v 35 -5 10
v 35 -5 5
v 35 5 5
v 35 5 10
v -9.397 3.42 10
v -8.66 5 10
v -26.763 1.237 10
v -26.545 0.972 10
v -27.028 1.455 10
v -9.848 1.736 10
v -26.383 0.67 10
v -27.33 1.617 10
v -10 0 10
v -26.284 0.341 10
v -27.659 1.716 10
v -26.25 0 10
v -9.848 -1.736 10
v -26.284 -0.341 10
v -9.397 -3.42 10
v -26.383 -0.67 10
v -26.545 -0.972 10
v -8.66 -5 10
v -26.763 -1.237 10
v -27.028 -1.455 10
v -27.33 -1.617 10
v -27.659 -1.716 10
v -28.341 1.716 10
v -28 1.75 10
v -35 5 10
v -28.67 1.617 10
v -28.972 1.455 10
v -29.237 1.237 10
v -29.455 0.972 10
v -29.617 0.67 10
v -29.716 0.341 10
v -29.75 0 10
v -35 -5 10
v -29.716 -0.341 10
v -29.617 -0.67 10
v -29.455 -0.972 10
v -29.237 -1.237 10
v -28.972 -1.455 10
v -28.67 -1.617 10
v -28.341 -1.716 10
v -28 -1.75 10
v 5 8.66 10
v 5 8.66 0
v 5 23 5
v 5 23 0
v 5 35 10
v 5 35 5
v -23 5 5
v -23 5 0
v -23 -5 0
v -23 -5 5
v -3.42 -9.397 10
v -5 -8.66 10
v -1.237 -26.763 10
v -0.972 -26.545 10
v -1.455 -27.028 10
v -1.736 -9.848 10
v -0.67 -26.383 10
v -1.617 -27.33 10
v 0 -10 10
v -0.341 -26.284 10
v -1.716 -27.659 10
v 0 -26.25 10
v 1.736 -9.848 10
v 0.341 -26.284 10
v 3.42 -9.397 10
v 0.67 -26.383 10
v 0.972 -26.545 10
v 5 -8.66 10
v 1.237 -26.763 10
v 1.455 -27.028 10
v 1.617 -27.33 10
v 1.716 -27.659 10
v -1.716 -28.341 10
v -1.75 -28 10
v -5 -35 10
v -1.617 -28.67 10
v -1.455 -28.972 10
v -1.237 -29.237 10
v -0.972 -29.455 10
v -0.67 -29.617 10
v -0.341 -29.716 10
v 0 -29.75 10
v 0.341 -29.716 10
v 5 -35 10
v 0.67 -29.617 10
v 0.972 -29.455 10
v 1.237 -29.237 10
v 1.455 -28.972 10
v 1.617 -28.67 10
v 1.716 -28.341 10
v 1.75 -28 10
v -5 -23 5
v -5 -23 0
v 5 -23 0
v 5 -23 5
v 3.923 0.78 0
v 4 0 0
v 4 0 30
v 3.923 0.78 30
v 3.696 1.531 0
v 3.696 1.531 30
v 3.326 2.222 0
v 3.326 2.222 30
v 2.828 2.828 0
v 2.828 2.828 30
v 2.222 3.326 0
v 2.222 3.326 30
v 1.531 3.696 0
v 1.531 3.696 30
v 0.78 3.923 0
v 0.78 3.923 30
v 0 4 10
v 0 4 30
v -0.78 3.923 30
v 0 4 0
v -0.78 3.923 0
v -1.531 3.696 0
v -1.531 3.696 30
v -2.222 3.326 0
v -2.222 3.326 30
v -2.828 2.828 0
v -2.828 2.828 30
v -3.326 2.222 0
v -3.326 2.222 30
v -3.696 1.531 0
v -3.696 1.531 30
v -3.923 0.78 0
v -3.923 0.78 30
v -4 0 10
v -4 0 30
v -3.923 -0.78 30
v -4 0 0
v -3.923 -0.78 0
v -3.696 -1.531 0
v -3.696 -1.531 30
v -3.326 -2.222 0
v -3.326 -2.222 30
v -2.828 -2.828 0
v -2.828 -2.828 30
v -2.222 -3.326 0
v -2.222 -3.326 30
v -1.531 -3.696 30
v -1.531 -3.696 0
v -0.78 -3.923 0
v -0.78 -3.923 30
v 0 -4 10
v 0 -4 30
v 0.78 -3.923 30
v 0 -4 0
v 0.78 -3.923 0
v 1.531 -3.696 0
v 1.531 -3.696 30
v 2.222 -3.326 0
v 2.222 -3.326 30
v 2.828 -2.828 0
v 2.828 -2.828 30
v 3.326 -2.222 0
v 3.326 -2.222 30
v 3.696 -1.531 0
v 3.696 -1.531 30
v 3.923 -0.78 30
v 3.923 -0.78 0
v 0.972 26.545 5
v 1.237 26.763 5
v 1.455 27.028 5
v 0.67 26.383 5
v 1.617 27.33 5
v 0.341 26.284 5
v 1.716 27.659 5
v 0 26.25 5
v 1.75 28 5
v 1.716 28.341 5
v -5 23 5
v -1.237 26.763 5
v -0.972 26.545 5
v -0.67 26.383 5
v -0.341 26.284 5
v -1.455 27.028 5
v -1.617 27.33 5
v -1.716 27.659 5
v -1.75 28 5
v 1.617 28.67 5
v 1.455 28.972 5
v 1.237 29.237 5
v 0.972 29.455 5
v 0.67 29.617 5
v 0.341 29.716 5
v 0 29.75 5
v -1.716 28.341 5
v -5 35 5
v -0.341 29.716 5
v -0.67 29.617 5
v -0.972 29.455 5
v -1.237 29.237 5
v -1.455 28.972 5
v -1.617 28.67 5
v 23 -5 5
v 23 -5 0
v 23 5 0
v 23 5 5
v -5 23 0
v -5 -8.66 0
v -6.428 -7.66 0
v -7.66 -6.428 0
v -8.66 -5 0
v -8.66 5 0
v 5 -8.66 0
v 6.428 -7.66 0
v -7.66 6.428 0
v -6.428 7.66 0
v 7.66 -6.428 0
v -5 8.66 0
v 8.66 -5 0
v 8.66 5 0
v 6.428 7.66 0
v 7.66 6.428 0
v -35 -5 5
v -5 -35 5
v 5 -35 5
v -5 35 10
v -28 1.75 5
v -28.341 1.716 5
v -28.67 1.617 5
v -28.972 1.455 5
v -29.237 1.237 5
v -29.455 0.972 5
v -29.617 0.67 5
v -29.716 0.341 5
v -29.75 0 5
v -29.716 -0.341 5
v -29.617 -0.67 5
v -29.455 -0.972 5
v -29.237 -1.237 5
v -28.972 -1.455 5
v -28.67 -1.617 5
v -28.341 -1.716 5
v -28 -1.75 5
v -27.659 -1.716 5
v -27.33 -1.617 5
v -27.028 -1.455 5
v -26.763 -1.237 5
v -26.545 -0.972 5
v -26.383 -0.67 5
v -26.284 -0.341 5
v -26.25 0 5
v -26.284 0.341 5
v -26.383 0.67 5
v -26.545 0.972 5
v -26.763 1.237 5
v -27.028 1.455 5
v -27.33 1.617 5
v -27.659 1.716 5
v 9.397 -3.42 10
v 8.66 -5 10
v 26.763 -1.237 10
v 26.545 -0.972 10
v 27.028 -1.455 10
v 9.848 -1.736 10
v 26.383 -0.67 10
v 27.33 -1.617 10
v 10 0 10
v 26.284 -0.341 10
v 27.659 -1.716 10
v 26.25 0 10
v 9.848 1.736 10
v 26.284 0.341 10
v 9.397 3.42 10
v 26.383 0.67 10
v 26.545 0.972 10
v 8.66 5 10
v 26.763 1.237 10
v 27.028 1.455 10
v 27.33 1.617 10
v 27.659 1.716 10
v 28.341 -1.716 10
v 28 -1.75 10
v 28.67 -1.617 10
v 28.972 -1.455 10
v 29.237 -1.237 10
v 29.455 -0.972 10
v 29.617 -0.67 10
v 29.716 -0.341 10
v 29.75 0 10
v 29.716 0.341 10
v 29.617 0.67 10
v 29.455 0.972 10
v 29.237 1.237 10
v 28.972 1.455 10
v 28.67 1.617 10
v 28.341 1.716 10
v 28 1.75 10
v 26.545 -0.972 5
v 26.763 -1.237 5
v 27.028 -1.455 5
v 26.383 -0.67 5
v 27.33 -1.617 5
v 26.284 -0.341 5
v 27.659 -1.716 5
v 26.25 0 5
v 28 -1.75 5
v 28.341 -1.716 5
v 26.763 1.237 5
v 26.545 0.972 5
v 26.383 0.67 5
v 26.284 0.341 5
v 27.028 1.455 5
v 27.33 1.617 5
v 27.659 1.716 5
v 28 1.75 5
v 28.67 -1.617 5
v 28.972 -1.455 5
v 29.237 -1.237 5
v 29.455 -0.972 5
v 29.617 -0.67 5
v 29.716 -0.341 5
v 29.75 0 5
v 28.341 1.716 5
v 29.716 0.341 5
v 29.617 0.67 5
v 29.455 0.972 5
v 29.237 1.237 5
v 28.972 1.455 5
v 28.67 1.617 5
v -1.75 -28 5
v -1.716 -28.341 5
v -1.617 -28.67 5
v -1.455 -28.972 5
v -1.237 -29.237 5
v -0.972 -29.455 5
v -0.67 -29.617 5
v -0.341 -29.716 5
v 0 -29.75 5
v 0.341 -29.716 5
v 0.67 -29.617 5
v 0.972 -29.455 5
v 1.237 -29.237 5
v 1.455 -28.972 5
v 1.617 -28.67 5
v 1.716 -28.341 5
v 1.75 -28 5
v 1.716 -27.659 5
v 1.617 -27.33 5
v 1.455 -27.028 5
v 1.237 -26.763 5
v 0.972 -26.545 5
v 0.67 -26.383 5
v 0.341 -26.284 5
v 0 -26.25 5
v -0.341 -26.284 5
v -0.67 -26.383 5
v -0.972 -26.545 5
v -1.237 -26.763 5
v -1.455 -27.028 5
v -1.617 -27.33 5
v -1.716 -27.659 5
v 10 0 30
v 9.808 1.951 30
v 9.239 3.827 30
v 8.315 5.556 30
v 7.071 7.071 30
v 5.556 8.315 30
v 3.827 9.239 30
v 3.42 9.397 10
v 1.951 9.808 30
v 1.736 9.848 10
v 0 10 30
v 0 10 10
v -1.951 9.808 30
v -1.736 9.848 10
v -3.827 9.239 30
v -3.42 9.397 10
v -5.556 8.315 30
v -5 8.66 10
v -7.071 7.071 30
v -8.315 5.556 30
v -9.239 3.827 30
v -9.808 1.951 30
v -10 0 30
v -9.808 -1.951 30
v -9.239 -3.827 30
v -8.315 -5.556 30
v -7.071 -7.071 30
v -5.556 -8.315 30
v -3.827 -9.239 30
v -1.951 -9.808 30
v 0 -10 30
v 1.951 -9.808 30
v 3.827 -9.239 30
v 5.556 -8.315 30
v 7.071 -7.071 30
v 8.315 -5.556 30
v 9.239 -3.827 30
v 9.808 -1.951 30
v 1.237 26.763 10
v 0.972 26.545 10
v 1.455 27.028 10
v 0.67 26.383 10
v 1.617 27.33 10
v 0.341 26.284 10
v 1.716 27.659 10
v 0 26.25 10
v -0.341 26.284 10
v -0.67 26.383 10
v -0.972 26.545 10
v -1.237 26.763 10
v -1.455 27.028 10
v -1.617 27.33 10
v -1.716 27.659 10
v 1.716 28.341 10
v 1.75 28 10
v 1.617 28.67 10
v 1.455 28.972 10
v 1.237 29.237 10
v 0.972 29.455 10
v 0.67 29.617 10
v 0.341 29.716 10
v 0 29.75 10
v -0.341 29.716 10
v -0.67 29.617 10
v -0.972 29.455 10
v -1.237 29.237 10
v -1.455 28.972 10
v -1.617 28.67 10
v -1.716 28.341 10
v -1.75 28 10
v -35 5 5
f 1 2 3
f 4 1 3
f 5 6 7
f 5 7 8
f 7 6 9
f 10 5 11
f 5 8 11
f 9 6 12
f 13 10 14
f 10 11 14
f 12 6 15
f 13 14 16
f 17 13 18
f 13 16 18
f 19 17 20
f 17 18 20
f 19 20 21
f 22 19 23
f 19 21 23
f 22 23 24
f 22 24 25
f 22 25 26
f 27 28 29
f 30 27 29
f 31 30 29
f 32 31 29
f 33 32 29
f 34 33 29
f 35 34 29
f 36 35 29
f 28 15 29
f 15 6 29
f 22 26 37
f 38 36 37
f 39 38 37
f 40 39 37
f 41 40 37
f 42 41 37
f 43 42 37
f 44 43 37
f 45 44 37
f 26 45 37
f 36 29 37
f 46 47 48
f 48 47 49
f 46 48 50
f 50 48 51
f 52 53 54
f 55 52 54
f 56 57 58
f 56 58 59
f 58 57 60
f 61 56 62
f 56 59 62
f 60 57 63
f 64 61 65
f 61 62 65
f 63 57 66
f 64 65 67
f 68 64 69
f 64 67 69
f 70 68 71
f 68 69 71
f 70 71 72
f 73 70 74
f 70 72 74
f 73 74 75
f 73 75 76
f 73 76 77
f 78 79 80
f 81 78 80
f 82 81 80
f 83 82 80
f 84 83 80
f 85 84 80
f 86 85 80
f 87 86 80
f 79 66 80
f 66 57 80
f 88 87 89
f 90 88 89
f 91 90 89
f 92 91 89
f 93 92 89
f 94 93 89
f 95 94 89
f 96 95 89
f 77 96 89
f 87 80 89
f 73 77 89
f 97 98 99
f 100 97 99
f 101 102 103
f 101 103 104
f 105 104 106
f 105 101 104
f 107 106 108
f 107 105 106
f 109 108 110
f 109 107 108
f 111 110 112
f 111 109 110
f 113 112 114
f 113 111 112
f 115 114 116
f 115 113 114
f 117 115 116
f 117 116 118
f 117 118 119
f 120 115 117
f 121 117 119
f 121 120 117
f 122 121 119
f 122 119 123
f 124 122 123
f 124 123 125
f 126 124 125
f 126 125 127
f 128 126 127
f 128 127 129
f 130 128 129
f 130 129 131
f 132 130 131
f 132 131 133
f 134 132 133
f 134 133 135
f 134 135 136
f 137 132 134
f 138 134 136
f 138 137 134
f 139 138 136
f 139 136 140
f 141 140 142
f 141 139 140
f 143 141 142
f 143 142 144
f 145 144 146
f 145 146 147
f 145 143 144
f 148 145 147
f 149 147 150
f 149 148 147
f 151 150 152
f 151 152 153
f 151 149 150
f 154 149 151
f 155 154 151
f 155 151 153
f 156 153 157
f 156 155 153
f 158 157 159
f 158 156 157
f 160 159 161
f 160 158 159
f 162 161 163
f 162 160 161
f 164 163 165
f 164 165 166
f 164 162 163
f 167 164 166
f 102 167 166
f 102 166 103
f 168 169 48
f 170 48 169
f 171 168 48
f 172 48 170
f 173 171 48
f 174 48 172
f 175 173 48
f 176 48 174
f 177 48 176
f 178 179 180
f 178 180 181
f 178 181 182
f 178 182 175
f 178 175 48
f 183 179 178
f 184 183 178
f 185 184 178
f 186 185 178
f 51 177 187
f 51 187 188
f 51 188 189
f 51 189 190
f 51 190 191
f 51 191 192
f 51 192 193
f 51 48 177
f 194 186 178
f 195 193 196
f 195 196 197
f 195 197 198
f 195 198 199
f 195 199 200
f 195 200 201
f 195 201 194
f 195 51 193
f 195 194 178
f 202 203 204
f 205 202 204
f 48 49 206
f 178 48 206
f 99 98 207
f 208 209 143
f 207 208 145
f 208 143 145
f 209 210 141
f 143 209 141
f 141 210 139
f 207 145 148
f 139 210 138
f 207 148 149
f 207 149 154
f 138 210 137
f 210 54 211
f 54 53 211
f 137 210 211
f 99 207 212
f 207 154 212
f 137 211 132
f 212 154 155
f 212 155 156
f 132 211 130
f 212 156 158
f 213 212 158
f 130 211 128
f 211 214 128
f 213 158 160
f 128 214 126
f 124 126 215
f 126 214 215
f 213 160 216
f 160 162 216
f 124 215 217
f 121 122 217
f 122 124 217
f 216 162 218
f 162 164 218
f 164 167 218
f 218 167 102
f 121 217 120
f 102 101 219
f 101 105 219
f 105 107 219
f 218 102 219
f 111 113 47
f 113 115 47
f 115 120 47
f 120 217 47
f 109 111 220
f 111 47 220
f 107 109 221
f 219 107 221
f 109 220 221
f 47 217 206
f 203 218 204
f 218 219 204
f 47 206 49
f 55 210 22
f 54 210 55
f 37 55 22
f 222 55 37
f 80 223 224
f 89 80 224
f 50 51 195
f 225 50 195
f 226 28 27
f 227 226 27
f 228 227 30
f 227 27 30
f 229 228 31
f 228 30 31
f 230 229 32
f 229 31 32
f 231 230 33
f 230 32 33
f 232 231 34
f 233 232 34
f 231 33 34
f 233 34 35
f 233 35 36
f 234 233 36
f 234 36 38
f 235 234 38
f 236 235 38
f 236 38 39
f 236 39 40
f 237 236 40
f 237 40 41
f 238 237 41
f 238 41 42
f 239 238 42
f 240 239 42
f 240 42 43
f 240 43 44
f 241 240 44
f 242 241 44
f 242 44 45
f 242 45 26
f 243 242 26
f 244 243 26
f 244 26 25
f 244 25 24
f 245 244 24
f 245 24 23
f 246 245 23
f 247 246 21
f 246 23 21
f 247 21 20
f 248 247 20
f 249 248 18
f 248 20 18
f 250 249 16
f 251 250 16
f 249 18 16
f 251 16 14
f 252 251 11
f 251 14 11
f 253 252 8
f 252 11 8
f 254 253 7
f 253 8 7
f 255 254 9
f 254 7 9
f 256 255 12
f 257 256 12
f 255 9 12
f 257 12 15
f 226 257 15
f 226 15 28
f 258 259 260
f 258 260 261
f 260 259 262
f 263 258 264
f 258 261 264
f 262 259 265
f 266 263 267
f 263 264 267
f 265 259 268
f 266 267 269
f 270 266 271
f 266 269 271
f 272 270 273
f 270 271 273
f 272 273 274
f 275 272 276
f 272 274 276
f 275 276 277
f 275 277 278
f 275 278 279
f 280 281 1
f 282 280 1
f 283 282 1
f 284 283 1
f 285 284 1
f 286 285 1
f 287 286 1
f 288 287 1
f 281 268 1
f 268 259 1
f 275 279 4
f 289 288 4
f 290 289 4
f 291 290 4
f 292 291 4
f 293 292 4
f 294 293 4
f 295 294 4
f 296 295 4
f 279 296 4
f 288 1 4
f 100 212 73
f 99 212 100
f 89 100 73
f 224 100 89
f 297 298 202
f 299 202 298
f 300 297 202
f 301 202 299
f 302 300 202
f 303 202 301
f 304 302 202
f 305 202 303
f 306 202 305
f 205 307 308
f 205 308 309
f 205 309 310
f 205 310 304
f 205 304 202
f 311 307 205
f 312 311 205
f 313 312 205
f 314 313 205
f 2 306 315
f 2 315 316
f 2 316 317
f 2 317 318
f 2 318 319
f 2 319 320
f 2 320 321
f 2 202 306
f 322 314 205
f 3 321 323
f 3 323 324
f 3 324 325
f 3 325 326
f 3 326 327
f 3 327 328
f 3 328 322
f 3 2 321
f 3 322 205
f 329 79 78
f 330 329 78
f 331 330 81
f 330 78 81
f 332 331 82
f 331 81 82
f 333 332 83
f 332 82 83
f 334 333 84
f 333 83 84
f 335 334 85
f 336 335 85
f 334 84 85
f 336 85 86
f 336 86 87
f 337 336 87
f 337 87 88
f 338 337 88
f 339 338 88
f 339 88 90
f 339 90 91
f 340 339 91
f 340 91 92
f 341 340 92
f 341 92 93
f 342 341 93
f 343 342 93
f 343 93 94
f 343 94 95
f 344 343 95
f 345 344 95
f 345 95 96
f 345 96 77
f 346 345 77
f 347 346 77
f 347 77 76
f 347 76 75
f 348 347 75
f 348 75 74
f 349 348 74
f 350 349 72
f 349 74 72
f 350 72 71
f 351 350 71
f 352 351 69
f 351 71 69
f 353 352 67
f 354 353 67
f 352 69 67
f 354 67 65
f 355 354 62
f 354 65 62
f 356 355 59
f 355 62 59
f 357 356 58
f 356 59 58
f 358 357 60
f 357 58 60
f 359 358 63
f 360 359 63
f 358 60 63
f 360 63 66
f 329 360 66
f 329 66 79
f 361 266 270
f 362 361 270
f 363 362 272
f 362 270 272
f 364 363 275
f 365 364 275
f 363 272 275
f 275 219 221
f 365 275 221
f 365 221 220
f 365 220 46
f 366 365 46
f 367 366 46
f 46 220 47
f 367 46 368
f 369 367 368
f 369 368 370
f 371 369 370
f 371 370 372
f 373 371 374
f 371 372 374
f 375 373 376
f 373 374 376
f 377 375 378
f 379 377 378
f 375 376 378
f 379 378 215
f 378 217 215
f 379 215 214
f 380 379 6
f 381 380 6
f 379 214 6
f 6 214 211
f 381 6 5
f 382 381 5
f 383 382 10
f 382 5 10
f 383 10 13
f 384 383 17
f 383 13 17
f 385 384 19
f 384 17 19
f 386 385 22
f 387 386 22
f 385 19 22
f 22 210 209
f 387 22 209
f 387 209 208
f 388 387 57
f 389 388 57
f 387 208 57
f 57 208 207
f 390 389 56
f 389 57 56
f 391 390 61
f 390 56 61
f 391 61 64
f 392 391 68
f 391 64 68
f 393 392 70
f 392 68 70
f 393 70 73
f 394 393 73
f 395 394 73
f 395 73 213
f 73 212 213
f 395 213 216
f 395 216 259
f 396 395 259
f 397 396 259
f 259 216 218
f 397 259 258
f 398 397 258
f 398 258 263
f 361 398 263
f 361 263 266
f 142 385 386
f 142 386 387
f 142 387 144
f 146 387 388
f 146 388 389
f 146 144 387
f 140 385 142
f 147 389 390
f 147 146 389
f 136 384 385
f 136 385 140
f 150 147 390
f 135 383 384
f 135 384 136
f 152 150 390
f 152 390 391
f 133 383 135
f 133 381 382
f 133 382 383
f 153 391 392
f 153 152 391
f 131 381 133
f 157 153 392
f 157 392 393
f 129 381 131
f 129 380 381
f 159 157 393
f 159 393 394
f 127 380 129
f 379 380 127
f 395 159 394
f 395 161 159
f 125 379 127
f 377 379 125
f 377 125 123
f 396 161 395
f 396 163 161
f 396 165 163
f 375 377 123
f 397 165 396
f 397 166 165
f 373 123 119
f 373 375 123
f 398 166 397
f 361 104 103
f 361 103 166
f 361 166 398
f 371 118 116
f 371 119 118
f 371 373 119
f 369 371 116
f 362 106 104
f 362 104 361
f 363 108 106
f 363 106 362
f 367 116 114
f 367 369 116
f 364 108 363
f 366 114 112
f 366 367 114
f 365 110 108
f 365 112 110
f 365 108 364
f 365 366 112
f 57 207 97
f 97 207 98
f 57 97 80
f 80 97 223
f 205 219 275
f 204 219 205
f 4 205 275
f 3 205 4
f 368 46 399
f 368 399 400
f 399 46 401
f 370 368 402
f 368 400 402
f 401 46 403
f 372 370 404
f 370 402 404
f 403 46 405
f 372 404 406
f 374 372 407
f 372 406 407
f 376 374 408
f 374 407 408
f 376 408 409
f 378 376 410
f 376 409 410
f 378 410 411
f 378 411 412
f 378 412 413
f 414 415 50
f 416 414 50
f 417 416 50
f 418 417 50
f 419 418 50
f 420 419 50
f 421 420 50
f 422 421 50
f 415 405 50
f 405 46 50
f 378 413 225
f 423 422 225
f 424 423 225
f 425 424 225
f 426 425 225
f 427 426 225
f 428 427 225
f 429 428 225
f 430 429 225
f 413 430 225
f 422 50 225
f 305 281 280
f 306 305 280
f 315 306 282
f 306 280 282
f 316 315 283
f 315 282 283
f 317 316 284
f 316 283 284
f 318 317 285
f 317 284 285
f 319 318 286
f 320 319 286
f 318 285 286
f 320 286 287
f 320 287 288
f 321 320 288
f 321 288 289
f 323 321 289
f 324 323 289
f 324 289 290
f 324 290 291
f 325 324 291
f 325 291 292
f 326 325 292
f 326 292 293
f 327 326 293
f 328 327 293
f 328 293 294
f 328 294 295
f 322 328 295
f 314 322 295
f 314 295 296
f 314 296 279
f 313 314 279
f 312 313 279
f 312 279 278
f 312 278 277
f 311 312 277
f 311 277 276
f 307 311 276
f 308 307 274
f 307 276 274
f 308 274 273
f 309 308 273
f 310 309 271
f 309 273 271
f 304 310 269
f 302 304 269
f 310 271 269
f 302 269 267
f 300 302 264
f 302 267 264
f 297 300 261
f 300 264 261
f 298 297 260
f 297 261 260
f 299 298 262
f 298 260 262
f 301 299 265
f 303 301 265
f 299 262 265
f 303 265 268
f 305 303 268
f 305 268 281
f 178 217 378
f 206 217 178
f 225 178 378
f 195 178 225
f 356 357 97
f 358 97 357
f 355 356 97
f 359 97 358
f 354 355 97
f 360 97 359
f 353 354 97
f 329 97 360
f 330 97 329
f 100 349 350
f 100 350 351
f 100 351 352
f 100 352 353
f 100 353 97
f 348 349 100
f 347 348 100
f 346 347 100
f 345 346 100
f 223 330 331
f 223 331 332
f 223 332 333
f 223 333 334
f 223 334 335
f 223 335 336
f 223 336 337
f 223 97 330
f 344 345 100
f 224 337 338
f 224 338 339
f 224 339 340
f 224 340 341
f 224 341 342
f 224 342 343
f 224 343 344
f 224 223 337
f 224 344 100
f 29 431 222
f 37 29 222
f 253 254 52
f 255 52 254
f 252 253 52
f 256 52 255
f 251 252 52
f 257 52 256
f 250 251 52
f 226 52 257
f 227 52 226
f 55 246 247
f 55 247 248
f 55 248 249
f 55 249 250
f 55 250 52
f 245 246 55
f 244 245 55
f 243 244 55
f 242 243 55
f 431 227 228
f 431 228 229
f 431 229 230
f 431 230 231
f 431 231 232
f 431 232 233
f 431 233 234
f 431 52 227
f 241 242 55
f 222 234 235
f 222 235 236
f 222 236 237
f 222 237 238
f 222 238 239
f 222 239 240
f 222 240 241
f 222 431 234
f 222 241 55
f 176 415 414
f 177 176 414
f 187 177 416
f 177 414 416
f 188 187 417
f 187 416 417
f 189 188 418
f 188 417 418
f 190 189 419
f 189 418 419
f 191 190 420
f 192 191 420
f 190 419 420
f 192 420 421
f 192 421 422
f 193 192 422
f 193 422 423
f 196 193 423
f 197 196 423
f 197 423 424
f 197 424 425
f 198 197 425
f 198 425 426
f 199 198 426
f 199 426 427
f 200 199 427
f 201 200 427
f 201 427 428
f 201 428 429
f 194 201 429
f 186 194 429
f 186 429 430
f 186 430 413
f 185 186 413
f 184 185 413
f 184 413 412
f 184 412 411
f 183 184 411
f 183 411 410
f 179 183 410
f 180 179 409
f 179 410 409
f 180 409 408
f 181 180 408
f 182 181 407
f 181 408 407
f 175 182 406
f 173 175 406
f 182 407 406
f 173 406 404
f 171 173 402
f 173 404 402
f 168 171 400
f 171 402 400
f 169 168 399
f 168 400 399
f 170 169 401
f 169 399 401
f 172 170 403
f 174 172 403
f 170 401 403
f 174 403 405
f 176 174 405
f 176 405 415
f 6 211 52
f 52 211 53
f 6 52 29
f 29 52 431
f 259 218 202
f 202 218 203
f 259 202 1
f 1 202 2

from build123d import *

# Parameters (mm, degrees)
SKETCH_1_R               = 10
SKETCH_1_R_2             = 4
EXTRUDE_1_DEPTH          = 30
SKETCH_2_W               = 10
SKETCH_2_H               = 31
EXTRUDE_2_DEPTH          = 10
SKETCH_3_W               = 10
SKETCH_3_H               = 12
CUT_EXTRUDE_1_DEPTH      = 5
HOLE_WIZARD_3_5_3_5_1_D  = 3.5
PATTERN_CIRCULAR_1_COUNT = 4


with BuildPart() as part:
    # Эскиз1 → Бобышка-Вытянуть1 (new body)
    with BuildSketch(Plane.XY):
        Circle(SKETCH_1_R)
        Circle(SKETCH_1_R_2, mode=Mode.SUBTRACT)
    extrude(amount=EXTRUDE_1_DEPTH)

    # Эскиз2 → Бобышка-Вытянуть2 (add)
    with BuildSketch(Plane(origin=(0, 0, 0), x_dir=(-1, 0, 0), z_dir=(0, 0, -1))):
        with Locations((0, 19.5)):
            Rectangle(SKETCH_2_W, SKETCH_2_H)
    extrude_2 = extrude(amount=-EXTRUDE_2_DEPTH)

    # Эскиз3 → Вырез-Вытянуть1 (cut)
    with BuildSketch(Plane(origin=(0, 0, 0), x_dir=(-1, 0, 0), z_dir=(0, 0, -1))):
        with Locations((0, 29)):
            Rectangle(SKETCH_3_W, SKETCH_3_H)
    cut_extrude_1 = extrude(amount=-CUT_EXTRUDE_1_DEPTH, mode=Mode.SUBTRACT)

    # Диаметр отверстия Ø3.5 (3.5)1 (through all)
    with Locations(Plane(origin=(0, 0, 5), x_dir=(-1, 0, 0), z_dir=(0, 0, -1))):
        with Locations((0, 28)):
            hole_wizard_3_5_3_5_1 = Hole(HOLE_WIZARD_3_5_3_5_1_D / 2)

    # Круговой массив1: Бобышка-Вытянуть2, Вырез-Вытянуть1, Диаметр отверстия Ø3.5 (3.5)1 ×4 about axis
    pattern_circular_1_axis = Axis((0, 0, 0), (0, 0, 1))
    for i in range(1, PATTERN_CIRCULAR_1_COUNT):
        add(extrude_2.rotate(pattern_circular_1_axis, i * 360 / PATTERN_CIRCULAR_1_COUNT))
        add(cut_extrude_1.rotate(pattern_circular_1_axis, i * 360 / PATTERN_CIRCULAR_1_COUNT), mode=Mode.SUBTRACT)
        add(hole_wizard_3_5_3_5_1.rotate(pattern_circular_1_axis, i * 360 / PATTERN_CIRCULAR_1_COUNT), mode=Mode.SUBTRACT)


solid = part.part
